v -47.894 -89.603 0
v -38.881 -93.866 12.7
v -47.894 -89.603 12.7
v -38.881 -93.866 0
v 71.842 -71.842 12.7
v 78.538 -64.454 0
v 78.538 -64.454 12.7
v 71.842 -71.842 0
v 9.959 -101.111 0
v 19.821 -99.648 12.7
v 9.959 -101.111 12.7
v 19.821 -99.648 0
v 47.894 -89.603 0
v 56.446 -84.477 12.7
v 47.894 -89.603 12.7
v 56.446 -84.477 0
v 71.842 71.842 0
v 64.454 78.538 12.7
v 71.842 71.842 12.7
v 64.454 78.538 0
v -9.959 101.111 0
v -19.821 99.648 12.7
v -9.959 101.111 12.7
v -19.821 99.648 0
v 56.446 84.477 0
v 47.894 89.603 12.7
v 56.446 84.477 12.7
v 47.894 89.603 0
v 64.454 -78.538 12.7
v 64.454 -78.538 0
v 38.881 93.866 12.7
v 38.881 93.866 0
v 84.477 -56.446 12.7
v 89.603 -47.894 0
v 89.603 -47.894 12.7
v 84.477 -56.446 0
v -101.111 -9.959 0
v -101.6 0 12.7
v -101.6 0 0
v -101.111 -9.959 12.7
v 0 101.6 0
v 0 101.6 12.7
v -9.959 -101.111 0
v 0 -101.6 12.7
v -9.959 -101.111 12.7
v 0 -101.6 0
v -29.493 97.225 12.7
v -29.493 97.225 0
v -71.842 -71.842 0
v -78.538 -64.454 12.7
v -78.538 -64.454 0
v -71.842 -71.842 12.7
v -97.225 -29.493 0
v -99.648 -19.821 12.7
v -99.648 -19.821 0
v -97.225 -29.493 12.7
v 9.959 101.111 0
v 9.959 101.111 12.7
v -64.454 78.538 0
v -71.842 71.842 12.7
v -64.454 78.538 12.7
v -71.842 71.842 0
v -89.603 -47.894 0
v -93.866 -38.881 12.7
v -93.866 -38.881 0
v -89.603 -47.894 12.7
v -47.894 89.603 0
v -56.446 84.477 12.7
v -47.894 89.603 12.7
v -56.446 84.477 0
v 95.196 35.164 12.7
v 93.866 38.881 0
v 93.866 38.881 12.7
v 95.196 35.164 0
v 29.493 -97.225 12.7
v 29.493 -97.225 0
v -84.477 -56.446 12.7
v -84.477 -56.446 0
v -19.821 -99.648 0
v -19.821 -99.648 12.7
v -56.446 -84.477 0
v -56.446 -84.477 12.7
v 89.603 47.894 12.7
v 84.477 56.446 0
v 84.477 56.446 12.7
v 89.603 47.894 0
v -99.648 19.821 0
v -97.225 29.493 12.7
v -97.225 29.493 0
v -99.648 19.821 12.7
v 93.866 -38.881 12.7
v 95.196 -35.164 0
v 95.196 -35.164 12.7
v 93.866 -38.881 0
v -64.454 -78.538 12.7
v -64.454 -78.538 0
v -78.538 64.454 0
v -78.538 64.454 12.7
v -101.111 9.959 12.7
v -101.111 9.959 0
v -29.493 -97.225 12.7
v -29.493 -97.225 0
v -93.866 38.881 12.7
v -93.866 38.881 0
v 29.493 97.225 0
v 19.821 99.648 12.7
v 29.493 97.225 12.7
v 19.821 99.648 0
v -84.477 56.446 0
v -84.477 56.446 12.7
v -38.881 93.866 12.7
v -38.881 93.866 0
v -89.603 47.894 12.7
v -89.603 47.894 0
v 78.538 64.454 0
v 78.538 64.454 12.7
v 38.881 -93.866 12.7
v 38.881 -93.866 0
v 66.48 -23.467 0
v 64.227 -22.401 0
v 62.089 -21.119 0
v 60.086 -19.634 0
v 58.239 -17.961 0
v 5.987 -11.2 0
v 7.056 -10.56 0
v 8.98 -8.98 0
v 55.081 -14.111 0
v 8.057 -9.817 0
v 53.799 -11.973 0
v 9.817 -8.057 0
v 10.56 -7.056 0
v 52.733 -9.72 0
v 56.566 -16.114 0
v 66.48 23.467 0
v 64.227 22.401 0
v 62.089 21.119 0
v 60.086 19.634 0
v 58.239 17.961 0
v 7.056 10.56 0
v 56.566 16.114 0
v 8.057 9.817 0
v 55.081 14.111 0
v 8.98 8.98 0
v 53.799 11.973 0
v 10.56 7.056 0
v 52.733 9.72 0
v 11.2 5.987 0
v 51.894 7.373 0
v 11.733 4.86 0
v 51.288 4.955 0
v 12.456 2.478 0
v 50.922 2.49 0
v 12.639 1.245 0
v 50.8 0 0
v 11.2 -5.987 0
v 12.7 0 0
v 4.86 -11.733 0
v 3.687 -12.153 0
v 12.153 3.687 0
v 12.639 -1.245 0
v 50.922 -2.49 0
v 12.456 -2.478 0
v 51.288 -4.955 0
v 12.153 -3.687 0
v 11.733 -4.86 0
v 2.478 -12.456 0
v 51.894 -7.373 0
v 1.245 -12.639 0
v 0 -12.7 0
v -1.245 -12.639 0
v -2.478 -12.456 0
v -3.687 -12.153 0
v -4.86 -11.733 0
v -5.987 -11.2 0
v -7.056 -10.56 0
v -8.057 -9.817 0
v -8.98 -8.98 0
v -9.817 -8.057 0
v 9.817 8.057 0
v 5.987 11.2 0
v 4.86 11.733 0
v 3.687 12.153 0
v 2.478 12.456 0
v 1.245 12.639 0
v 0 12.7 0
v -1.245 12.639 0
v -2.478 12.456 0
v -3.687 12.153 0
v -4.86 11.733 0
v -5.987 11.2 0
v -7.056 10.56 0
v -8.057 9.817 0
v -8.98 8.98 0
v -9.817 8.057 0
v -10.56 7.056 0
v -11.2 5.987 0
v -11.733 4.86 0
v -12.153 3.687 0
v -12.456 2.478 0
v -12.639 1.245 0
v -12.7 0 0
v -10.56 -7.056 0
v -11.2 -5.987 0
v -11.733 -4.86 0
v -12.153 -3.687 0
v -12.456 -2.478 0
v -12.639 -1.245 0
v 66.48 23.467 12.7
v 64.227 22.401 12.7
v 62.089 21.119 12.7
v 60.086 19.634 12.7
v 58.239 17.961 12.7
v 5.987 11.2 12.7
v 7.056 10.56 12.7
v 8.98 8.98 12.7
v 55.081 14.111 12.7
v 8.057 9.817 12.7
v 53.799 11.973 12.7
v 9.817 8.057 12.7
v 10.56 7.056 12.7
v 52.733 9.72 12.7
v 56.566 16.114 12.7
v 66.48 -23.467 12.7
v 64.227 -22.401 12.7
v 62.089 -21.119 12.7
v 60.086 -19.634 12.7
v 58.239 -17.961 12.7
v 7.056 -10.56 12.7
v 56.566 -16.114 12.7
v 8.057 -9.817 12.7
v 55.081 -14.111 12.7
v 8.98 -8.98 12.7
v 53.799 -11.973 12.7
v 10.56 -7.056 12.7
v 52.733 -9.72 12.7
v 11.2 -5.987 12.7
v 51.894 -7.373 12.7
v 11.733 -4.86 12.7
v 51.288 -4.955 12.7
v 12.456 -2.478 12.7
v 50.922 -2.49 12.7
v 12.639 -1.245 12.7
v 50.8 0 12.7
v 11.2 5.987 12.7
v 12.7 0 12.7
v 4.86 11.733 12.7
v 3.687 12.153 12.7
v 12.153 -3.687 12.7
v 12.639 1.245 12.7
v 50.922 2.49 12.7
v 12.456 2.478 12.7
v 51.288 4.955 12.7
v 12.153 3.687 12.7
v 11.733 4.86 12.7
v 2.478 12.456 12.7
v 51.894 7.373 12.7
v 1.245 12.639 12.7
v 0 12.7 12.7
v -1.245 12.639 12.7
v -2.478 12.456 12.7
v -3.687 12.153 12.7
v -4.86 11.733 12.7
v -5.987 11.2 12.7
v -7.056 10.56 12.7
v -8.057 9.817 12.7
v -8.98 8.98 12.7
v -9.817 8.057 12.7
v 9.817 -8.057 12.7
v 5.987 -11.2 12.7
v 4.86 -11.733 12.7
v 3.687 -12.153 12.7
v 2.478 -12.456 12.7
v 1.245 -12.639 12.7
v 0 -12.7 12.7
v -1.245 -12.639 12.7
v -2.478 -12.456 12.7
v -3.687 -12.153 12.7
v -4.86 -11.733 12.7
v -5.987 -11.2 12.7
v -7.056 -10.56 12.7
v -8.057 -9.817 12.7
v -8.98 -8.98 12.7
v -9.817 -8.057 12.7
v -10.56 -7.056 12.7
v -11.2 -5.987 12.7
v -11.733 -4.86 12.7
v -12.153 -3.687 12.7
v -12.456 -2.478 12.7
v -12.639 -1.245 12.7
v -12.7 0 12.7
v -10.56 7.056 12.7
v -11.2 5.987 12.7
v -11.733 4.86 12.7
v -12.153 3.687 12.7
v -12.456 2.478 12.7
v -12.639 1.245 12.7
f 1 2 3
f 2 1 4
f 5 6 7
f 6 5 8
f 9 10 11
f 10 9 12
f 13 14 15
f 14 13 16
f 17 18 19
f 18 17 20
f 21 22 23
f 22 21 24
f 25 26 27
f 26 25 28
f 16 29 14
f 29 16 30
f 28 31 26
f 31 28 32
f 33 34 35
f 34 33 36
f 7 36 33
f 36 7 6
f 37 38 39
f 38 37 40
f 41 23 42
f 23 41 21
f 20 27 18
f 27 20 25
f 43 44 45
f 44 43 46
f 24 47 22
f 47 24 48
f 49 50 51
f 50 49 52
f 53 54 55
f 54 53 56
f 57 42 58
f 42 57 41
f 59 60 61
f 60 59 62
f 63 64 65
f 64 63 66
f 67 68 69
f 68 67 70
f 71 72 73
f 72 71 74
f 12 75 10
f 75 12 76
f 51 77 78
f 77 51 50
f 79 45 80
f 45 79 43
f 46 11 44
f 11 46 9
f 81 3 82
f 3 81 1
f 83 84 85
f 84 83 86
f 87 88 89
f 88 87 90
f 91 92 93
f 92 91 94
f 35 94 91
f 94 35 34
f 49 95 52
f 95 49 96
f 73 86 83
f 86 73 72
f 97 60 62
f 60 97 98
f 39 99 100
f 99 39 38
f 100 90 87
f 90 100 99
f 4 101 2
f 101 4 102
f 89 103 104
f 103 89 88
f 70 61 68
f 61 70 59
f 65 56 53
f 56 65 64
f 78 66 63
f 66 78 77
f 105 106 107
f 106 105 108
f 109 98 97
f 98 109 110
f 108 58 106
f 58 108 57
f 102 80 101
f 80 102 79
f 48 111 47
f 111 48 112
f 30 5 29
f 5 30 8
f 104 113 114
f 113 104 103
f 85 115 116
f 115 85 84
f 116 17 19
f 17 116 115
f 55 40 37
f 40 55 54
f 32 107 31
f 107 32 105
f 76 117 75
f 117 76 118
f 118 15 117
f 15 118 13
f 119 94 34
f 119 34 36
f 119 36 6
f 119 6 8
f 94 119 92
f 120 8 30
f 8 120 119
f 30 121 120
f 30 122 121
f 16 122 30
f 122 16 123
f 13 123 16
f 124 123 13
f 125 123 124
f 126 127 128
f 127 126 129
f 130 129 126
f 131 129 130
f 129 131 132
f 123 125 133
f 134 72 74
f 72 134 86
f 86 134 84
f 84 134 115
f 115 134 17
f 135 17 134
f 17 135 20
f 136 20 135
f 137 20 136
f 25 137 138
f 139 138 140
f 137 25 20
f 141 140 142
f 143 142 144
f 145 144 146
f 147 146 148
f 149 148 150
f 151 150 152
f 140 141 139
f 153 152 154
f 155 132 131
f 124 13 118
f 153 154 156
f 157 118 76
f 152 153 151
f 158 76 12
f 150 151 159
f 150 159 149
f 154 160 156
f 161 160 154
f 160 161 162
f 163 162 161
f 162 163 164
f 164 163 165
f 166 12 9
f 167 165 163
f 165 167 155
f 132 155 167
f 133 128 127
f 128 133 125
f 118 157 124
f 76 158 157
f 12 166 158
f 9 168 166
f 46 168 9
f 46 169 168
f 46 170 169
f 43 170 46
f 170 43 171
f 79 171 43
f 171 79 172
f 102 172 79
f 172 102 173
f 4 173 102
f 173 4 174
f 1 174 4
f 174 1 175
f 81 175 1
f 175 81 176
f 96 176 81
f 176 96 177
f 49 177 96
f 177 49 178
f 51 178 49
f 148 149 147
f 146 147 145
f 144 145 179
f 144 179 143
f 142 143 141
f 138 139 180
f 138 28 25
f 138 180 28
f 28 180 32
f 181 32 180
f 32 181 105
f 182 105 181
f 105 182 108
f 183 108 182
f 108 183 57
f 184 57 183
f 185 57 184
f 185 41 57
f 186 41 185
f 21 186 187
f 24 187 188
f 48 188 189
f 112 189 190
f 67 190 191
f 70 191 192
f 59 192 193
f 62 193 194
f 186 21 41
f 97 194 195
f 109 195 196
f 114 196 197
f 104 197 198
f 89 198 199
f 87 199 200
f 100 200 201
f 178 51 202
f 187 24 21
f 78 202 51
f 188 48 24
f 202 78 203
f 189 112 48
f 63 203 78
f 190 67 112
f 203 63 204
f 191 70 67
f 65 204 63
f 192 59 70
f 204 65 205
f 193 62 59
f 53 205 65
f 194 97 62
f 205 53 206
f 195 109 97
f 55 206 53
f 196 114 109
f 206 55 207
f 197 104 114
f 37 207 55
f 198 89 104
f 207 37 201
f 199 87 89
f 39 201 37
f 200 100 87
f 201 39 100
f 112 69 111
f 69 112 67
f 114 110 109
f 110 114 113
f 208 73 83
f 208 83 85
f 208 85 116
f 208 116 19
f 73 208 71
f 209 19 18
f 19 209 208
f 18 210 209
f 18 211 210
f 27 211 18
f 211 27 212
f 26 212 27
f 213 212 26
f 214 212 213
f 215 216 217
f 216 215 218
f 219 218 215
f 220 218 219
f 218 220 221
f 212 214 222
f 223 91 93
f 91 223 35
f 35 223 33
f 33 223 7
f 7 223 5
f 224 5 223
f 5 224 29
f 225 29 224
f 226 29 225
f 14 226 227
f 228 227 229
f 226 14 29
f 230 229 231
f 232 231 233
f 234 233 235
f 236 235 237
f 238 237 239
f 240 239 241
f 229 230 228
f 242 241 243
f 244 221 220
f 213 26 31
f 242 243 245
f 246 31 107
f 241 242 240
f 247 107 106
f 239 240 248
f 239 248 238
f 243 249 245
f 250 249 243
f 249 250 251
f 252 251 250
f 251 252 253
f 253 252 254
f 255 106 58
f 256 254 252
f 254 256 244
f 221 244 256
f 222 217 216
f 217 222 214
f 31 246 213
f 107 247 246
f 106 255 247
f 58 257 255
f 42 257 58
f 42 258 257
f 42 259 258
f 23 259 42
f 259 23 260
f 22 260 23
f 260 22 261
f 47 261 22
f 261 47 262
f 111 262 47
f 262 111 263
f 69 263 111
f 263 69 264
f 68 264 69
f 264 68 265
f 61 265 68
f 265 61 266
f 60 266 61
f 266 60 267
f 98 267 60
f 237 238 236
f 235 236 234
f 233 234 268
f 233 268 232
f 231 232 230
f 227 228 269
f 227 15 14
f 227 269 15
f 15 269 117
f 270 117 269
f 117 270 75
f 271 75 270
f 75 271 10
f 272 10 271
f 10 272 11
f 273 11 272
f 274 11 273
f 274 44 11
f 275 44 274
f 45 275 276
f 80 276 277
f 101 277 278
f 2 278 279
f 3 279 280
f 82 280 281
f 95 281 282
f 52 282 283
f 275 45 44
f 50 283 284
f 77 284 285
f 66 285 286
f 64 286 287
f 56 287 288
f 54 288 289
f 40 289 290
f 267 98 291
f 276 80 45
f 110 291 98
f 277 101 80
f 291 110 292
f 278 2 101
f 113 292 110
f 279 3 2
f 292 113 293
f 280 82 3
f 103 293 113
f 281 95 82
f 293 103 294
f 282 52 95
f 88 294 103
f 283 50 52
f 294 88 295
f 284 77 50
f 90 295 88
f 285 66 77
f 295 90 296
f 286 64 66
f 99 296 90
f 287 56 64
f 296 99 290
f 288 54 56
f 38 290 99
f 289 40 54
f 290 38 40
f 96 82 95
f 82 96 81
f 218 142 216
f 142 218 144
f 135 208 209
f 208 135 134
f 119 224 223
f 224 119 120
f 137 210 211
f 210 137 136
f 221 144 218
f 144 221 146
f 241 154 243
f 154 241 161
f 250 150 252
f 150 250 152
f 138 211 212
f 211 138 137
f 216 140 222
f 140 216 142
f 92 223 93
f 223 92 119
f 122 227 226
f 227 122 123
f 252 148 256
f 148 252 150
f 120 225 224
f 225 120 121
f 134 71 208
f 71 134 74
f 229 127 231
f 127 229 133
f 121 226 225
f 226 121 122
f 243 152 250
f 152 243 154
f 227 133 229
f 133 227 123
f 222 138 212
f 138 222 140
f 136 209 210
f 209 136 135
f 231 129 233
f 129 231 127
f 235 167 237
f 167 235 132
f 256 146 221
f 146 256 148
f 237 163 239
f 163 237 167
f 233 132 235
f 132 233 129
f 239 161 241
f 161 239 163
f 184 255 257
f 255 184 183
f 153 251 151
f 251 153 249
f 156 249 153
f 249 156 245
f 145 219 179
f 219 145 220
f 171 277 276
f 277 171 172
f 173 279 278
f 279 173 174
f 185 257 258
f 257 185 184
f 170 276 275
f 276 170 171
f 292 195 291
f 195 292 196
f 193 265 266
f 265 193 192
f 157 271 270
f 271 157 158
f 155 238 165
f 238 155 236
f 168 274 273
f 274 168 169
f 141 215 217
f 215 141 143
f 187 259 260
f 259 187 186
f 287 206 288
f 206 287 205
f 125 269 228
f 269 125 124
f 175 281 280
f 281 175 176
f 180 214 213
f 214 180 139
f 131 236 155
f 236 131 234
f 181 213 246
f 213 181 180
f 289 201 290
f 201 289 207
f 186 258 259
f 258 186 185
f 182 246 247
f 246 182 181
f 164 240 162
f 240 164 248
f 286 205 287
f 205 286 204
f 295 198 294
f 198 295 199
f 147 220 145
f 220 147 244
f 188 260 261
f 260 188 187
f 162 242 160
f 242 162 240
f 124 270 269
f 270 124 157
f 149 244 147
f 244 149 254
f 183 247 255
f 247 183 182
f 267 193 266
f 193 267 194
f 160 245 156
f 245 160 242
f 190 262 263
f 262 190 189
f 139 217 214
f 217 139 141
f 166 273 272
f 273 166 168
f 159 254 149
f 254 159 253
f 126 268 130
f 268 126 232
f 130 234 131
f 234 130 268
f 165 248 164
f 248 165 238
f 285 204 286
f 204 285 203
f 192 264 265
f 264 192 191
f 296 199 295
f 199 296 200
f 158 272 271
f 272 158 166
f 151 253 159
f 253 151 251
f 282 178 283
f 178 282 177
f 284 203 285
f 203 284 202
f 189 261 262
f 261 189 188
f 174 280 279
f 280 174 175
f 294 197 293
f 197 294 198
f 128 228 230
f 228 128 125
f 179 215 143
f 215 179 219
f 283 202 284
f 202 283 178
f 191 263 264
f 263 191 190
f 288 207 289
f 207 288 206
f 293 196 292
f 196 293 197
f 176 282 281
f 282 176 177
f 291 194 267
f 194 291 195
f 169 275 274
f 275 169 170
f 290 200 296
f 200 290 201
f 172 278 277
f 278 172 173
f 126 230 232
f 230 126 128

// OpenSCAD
// ball pump wheel

/* 
  major_r - is the radius of the main body circle
  bite_r  - is the size of the ball 
              (the circle at the base of pacman's mouth)
  axle_r  - is the size of the hole for the axle
  z_dim   - is the thickness of the material
  detail  - is the $fn passed into the cylinders (face count)
*/     
module ball_pump_wheel(major_r, bite_r, axle_r, z_dim, detail) {
    $cut_z = z_dim+2;
    $bpw_peg=1;
    difference() {
        // main body
        cylinder(r=major_r, h=z_dim, $fn=detail);
        // packman mouth
        translate([major_r - (bite_r),0,-1]) {
            hull() {
                cylinder(r=bite_r, h=$cut_z, $fn=detail);
                translate([major_r, major_r/1.5,0]) {
                    cylinder(r=$bpw_peg, h=$cut_z, $fn=detail);
                }
                translate([major_r,-major_r/1.5,0]) {
                    cylinder(r=$bpw_peg, h=$cut_z, $fn=detail);
                }
            }
        }
        // axle hole
        translate([0,0,-1]) {
            cylinder(r=axle_r, h=$cut_z, $fn=detail);
        }
    }
}

//constants
$detail = 64;
$inch = 25.4;

function inch (ii) = ii * $inch;

// Variables for shape, meant to be changed.
// NOTE: "$major_r > $bite_r + $axle_r" by some amount, or the axle hole gets consumed by the "bite wedge"
$vmajor_r=inch(4);   // Size of overall piece
$vbite_r=inch(1);     // radius of nesting circle (ball radius)
$vz_dim = inch(0.5);  // material thickness
$vaxle_r = inch(0.5); // size of axle hole

module make_parts() {
	ball_pump_wheel($vmajor_r, $vbite_r, $vaxle_r, $vz_dim, $detail);
}

$2d = 0;
if ($2d) {
    projection(cut=true) {
       translate([0,0,0]) rotate([0,0,0]) {
         make_parts();
       }
	}
} else {
    make_parts();
}
